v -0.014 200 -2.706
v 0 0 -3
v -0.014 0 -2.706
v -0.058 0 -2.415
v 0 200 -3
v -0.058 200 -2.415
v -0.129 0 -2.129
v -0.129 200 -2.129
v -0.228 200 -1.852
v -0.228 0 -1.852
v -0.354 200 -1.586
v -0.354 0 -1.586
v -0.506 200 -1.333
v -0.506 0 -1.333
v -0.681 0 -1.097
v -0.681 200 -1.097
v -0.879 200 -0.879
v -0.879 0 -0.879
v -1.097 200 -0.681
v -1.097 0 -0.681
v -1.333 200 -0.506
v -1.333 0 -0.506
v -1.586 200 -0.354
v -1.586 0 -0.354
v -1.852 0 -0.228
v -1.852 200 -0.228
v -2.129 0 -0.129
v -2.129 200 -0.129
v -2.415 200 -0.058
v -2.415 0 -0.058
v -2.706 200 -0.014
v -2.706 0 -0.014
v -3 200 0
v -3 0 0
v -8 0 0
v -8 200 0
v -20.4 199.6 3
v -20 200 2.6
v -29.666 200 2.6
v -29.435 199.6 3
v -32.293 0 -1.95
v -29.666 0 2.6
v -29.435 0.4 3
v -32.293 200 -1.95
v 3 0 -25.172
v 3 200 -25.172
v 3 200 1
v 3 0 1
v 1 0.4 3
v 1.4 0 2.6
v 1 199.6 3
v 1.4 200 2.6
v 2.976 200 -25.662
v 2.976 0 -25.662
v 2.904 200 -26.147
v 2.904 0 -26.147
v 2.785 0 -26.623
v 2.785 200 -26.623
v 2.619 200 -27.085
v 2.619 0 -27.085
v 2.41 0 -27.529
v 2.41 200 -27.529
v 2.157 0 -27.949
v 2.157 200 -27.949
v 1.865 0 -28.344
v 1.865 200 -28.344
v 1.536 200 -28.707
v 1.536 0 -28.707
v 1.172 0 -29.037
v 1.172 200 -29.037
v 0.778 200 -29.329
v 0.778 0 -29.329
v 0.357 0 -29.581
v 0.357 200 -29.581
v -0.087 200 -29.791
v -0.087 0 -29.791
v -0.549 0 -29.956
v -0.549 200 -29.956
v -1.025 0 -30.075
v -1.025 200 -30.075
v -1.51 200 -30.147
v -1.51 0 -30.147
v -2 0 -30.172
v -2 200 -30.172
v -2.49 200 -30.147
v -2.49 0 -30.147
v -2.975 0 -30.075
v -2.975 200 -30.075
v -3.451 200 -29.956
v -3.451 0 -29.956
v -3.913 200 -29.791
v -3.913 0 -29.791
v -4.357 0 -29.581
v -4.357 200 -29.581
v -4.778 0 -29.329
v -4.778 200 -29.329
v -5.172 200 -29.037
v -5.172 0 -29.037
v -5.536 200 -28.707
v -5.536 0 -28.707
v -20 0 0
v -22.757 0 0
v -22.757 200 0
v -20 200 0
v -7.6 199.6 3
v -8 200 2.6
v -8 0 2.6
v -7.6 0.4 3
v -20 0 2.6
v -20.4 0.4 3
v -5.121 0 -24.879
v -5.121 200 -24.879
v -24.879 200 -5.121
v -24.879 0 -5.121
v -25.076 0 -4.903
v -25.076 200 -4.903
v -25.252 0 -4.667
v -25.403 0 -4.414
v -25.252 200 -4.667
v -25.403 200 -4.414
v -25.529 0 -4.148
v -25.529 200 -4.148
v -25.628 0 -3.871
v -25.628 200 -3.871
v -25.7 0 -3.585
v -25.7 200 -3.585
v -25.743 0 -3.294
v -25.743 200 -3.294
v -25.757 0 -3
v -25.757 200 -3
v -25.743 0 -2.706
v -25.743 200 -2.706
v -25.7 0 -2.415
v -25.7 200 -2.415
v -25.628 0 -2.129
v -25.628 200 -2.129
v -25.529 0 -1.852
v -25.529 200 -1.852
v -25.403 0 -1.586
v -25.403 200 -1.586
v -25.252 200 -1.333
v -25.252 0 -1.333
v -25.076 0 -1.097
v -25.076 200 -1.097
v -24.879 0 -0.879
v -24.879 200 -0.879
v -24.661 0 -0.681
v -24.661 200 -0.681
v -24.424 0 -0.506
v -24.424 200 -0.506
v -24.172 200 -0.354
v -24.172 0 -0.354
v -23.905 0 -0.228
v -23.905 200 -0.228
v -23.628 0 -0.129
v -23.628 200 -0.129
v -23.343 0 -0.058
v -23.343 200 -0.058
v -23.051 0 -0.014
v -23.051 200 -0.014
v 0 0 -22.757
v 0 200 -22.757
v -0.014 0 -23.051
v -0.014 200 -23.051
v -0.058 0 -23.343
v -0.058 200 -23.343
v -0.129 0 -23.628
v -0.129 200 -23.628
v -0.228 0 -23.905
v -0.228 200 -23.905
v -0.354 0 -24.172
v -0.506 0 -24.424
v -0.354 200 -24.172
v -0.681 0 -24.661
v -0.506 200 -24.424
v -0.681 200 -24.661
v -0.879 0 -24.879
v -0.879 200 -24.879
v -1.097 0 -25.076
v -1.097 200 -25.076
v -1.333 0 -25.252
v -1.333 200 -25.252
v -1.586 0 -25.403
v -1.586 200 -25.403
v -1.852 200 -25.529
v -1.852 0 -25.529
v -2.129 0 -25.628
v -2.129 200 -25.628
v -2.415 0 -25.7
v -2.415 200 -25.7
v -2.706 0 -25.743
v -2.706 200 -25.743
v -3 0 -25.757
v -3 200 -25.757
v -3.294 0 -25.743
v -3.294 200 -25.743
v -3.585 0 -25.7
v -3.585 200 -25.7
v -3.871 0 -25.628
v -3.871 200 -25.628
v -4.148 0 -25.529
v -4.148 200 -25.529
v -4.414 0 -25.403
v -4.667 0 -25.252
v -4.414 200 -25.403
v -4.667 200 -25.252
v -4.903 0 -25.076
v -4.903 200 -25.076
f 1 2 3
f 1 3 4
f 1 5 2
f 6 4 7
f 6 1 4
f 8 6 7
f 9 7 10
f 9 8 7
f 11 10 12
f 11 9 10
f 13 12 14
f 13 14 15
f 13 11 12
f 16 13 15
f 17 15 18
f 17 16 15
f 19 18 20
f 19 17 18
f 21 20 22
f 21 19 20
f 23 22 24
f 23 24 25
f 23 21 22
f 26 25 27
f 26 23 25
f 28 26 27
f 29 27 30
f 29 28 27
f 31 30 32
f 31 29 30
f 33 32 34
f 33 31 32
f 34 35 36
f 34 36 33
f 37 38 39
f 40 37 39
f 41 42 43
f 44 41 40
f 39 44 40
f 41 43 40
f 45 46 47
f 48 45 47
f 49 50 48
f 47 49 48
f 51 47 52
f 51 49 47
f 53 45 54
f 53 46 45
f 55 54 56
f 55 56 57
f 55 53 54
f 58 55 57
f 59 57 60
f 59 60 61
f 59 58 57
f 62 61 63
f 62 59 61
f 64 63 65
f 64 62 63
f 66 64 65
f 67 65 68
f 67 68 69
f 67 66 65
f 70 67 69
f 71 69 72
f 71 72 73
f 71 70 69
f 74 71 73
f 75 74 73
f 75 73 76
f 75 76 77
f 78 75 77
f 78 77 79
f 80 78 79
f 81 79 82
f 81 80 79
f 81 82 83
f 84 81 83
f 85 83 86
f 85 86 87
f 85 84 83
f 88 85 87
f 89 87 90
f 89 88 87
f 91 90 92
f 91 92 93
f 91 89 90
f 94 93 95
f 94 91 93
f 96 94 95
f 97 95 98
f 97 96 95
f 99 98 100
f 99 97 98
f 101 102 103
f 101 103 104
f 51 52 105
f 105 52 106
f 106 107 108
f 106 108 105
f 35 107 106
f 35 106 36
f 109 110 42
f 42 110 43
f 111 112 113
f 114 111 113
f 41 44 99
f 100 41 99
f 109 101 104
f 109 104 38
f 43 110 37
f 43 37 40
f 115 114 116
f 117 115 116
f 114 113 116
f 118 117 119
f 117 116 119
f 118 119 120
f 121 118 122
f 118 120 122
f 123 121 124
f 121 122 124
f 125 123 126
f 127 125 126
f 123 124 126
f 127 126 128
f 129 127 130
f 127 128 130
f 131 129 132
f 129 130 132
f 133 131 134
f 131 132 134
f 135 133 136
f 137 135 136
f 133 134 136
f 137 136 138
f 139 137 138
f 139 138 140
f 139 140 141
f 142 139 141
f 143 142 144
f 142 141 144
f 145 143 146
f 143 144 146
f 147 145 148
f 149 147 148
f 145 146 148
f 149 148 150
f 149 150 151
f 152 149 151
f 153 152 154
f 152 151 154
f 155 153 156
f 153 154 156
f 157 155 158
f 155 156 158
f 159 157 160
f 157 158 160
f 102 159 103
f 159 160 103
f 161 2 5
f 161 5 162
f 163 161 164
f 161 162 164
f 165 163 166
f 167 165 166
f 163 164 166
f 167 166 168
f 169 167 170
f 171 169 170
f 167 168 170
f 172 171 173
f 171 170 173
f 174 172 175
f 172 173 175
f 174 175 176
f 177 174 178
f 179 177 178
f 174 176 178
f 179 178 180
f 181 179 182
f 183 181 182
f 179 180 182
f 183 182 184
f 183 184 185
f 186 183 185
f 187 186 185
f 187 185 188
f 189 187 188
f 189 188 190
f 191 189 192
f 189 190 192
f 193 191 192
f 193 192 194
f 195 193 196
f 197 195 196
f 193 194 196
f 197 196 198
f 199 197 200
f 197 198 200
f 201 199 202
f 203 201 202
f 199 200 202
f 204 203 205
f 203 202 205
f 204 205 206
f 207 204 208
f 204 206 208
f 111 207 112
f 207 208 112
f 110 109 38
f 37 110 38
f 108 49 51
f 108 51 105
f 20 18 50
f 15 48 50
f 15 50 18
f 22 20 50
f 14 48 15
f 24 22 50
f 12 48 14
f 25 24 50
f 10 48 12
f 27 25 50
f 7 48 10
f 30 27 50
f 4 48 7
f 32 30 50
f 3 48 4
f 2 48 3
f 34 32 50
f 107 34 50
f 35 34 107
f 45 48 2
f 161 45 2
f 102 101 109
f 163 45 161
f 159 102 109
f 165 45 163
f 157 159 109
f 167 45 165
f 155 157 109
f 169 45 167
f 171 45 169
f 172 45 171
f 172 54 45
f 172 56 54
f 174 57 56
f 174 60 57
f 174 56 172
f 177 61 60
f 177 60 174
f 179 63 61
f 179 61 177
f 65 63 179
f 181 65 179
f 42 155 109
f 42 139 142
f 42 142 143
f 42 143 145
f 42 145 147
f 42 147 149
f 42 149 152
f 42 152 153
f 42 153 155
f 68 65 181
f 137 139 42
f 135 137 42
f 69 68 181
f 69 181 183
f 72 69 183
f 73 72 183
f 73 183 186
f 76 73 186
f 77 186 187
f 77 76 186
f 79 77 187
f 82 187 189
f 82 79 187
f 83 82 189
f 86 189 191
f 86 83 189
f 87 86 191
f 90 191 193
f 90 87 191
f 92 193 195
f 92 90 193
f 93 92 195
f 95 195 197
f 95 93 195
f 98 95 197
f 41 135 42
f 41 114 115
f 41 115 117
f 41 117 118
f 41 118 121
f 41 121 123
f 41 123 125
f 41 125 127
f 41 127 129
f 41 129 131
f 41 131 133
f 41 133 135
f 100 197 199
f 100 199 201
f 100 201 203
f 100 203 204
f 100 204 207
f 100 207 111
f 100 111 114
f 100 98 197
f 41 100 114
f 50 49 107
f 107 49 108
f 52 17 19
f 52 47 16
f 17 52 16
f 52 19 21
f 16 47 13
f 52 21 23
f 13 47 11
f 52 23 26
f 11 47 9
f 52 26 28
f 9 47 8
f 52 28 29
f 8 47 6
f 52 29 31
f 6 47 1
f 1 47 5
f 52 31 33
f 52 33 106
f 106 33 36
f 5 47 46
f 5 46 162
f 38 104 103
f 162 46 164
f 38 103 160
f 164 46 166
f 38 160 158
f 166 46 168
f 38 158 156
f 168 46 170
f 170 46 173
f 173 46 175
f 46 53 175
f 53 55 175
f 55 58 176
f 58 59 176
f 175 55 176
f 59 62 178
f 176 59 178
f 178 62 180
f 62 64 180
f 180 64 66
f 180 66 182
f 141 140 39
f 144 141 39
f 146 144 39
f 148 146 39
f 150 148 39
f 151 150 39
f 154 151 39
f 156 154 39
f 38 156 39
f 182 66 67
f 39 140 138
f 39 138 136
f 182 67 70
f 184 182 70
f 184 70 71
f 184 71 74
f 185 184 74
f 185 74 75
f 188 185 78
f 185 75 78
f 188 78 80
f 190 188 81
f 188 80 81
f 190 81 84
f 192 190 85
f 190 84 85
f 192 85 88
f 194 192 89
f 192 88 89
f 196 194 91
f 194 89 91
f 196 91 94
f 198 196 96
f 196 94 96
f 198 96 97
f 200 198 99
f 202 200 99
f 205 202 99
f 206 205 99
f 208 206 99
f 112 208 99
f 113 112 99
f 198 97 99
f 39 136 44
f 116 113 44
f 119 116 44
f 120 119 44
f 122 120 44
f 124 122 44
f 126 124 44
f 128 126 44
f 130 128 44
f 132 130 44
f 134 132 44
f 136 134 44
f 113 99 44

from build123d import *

# Parameters (mm, degrees)
EXTRUDE_1_DEPTH = 200
FILLET_1_R      = 3
FILLET_2_R      = 5
CHAMFER_1_SIZE  = 7
CHAMFER_1_SIZE2 = 7.807485502
CHAMFER_2_SIZE  = 2
CHAMFER_3_SIZE  = 0.4


with BuildPart() as part:
    # 草图1 → 凸台-拉伸1 (new body)
    with BuildSketch(Plane(origin=(0, 0, 0), x_dir=(1, 0, 0), z_dir=(0, 1, 0))):
        Polygon((0, 0), (0, 30), (-30, 0), (-20, 0), (-20, -3), (-37.242640687, -3), (3, 37.242640687), (3, -3), (-8, -3), (-8, 0), align=None)
    extrude(amount=EXTRUDE_1_DEPTH)

    # 圆角1
    fillet_1_edges = [part.edges().sort_by_distance(p)[0] for p in [
        (0, 100, 0),
        (0, 100, -30),
        (-30, 100, 0),
    ]]
    fillet(fillet_1_edges, radius=FILLET_1_R)

    # 圆角2
    fillet_2_edges = [part.edges().sort_by_distance(p)[0] for p in [
        (3, 100, -37.242640687),
    ]]
    fillet(fillet_2_edges, radius=FILLET_2_R)

    # 倒角1
    chamfer_1_edges = [part.edges().sort_by_distance(p)[0] for p in [
        (-37.242640687, 100, 3),
    ]]
    chamfer_1_side = [part.faces().sort_by_distance(p)[0] for p in [
        (-21.389087297, 100, -12.853553391),
    ]]
    chamfer(chamfer_1_edges, length=CHAMFER_1_SIZE, length2=CHAMFER_1_SIZE2, reference=chamfer_1_side[0])

    # 倒角2
    chamfer_2_edges = [part.edges().sort_by_distance(p)[0] for p in [
        (3, 100, 3),
    ]]
    chamfer(chamfer_2_edges, length=CHAMFER_2_SIZE)

    # 倒角3
    chamfer_3_edges = [part.edges().sort_by_distance(p)[0] for p in [
        (-3.5, 200, 3),
        (-3.5, 0, 3),
        (-20, 100, 3),
        (-8, 100, 3),
        (-24.717577593, 0, 3),
        (-24.717577593, 200, 3),
    ]]
    chamfer(chamfer_3_edges, length=CHAMFER_3_SIZE)


solid = part.part
